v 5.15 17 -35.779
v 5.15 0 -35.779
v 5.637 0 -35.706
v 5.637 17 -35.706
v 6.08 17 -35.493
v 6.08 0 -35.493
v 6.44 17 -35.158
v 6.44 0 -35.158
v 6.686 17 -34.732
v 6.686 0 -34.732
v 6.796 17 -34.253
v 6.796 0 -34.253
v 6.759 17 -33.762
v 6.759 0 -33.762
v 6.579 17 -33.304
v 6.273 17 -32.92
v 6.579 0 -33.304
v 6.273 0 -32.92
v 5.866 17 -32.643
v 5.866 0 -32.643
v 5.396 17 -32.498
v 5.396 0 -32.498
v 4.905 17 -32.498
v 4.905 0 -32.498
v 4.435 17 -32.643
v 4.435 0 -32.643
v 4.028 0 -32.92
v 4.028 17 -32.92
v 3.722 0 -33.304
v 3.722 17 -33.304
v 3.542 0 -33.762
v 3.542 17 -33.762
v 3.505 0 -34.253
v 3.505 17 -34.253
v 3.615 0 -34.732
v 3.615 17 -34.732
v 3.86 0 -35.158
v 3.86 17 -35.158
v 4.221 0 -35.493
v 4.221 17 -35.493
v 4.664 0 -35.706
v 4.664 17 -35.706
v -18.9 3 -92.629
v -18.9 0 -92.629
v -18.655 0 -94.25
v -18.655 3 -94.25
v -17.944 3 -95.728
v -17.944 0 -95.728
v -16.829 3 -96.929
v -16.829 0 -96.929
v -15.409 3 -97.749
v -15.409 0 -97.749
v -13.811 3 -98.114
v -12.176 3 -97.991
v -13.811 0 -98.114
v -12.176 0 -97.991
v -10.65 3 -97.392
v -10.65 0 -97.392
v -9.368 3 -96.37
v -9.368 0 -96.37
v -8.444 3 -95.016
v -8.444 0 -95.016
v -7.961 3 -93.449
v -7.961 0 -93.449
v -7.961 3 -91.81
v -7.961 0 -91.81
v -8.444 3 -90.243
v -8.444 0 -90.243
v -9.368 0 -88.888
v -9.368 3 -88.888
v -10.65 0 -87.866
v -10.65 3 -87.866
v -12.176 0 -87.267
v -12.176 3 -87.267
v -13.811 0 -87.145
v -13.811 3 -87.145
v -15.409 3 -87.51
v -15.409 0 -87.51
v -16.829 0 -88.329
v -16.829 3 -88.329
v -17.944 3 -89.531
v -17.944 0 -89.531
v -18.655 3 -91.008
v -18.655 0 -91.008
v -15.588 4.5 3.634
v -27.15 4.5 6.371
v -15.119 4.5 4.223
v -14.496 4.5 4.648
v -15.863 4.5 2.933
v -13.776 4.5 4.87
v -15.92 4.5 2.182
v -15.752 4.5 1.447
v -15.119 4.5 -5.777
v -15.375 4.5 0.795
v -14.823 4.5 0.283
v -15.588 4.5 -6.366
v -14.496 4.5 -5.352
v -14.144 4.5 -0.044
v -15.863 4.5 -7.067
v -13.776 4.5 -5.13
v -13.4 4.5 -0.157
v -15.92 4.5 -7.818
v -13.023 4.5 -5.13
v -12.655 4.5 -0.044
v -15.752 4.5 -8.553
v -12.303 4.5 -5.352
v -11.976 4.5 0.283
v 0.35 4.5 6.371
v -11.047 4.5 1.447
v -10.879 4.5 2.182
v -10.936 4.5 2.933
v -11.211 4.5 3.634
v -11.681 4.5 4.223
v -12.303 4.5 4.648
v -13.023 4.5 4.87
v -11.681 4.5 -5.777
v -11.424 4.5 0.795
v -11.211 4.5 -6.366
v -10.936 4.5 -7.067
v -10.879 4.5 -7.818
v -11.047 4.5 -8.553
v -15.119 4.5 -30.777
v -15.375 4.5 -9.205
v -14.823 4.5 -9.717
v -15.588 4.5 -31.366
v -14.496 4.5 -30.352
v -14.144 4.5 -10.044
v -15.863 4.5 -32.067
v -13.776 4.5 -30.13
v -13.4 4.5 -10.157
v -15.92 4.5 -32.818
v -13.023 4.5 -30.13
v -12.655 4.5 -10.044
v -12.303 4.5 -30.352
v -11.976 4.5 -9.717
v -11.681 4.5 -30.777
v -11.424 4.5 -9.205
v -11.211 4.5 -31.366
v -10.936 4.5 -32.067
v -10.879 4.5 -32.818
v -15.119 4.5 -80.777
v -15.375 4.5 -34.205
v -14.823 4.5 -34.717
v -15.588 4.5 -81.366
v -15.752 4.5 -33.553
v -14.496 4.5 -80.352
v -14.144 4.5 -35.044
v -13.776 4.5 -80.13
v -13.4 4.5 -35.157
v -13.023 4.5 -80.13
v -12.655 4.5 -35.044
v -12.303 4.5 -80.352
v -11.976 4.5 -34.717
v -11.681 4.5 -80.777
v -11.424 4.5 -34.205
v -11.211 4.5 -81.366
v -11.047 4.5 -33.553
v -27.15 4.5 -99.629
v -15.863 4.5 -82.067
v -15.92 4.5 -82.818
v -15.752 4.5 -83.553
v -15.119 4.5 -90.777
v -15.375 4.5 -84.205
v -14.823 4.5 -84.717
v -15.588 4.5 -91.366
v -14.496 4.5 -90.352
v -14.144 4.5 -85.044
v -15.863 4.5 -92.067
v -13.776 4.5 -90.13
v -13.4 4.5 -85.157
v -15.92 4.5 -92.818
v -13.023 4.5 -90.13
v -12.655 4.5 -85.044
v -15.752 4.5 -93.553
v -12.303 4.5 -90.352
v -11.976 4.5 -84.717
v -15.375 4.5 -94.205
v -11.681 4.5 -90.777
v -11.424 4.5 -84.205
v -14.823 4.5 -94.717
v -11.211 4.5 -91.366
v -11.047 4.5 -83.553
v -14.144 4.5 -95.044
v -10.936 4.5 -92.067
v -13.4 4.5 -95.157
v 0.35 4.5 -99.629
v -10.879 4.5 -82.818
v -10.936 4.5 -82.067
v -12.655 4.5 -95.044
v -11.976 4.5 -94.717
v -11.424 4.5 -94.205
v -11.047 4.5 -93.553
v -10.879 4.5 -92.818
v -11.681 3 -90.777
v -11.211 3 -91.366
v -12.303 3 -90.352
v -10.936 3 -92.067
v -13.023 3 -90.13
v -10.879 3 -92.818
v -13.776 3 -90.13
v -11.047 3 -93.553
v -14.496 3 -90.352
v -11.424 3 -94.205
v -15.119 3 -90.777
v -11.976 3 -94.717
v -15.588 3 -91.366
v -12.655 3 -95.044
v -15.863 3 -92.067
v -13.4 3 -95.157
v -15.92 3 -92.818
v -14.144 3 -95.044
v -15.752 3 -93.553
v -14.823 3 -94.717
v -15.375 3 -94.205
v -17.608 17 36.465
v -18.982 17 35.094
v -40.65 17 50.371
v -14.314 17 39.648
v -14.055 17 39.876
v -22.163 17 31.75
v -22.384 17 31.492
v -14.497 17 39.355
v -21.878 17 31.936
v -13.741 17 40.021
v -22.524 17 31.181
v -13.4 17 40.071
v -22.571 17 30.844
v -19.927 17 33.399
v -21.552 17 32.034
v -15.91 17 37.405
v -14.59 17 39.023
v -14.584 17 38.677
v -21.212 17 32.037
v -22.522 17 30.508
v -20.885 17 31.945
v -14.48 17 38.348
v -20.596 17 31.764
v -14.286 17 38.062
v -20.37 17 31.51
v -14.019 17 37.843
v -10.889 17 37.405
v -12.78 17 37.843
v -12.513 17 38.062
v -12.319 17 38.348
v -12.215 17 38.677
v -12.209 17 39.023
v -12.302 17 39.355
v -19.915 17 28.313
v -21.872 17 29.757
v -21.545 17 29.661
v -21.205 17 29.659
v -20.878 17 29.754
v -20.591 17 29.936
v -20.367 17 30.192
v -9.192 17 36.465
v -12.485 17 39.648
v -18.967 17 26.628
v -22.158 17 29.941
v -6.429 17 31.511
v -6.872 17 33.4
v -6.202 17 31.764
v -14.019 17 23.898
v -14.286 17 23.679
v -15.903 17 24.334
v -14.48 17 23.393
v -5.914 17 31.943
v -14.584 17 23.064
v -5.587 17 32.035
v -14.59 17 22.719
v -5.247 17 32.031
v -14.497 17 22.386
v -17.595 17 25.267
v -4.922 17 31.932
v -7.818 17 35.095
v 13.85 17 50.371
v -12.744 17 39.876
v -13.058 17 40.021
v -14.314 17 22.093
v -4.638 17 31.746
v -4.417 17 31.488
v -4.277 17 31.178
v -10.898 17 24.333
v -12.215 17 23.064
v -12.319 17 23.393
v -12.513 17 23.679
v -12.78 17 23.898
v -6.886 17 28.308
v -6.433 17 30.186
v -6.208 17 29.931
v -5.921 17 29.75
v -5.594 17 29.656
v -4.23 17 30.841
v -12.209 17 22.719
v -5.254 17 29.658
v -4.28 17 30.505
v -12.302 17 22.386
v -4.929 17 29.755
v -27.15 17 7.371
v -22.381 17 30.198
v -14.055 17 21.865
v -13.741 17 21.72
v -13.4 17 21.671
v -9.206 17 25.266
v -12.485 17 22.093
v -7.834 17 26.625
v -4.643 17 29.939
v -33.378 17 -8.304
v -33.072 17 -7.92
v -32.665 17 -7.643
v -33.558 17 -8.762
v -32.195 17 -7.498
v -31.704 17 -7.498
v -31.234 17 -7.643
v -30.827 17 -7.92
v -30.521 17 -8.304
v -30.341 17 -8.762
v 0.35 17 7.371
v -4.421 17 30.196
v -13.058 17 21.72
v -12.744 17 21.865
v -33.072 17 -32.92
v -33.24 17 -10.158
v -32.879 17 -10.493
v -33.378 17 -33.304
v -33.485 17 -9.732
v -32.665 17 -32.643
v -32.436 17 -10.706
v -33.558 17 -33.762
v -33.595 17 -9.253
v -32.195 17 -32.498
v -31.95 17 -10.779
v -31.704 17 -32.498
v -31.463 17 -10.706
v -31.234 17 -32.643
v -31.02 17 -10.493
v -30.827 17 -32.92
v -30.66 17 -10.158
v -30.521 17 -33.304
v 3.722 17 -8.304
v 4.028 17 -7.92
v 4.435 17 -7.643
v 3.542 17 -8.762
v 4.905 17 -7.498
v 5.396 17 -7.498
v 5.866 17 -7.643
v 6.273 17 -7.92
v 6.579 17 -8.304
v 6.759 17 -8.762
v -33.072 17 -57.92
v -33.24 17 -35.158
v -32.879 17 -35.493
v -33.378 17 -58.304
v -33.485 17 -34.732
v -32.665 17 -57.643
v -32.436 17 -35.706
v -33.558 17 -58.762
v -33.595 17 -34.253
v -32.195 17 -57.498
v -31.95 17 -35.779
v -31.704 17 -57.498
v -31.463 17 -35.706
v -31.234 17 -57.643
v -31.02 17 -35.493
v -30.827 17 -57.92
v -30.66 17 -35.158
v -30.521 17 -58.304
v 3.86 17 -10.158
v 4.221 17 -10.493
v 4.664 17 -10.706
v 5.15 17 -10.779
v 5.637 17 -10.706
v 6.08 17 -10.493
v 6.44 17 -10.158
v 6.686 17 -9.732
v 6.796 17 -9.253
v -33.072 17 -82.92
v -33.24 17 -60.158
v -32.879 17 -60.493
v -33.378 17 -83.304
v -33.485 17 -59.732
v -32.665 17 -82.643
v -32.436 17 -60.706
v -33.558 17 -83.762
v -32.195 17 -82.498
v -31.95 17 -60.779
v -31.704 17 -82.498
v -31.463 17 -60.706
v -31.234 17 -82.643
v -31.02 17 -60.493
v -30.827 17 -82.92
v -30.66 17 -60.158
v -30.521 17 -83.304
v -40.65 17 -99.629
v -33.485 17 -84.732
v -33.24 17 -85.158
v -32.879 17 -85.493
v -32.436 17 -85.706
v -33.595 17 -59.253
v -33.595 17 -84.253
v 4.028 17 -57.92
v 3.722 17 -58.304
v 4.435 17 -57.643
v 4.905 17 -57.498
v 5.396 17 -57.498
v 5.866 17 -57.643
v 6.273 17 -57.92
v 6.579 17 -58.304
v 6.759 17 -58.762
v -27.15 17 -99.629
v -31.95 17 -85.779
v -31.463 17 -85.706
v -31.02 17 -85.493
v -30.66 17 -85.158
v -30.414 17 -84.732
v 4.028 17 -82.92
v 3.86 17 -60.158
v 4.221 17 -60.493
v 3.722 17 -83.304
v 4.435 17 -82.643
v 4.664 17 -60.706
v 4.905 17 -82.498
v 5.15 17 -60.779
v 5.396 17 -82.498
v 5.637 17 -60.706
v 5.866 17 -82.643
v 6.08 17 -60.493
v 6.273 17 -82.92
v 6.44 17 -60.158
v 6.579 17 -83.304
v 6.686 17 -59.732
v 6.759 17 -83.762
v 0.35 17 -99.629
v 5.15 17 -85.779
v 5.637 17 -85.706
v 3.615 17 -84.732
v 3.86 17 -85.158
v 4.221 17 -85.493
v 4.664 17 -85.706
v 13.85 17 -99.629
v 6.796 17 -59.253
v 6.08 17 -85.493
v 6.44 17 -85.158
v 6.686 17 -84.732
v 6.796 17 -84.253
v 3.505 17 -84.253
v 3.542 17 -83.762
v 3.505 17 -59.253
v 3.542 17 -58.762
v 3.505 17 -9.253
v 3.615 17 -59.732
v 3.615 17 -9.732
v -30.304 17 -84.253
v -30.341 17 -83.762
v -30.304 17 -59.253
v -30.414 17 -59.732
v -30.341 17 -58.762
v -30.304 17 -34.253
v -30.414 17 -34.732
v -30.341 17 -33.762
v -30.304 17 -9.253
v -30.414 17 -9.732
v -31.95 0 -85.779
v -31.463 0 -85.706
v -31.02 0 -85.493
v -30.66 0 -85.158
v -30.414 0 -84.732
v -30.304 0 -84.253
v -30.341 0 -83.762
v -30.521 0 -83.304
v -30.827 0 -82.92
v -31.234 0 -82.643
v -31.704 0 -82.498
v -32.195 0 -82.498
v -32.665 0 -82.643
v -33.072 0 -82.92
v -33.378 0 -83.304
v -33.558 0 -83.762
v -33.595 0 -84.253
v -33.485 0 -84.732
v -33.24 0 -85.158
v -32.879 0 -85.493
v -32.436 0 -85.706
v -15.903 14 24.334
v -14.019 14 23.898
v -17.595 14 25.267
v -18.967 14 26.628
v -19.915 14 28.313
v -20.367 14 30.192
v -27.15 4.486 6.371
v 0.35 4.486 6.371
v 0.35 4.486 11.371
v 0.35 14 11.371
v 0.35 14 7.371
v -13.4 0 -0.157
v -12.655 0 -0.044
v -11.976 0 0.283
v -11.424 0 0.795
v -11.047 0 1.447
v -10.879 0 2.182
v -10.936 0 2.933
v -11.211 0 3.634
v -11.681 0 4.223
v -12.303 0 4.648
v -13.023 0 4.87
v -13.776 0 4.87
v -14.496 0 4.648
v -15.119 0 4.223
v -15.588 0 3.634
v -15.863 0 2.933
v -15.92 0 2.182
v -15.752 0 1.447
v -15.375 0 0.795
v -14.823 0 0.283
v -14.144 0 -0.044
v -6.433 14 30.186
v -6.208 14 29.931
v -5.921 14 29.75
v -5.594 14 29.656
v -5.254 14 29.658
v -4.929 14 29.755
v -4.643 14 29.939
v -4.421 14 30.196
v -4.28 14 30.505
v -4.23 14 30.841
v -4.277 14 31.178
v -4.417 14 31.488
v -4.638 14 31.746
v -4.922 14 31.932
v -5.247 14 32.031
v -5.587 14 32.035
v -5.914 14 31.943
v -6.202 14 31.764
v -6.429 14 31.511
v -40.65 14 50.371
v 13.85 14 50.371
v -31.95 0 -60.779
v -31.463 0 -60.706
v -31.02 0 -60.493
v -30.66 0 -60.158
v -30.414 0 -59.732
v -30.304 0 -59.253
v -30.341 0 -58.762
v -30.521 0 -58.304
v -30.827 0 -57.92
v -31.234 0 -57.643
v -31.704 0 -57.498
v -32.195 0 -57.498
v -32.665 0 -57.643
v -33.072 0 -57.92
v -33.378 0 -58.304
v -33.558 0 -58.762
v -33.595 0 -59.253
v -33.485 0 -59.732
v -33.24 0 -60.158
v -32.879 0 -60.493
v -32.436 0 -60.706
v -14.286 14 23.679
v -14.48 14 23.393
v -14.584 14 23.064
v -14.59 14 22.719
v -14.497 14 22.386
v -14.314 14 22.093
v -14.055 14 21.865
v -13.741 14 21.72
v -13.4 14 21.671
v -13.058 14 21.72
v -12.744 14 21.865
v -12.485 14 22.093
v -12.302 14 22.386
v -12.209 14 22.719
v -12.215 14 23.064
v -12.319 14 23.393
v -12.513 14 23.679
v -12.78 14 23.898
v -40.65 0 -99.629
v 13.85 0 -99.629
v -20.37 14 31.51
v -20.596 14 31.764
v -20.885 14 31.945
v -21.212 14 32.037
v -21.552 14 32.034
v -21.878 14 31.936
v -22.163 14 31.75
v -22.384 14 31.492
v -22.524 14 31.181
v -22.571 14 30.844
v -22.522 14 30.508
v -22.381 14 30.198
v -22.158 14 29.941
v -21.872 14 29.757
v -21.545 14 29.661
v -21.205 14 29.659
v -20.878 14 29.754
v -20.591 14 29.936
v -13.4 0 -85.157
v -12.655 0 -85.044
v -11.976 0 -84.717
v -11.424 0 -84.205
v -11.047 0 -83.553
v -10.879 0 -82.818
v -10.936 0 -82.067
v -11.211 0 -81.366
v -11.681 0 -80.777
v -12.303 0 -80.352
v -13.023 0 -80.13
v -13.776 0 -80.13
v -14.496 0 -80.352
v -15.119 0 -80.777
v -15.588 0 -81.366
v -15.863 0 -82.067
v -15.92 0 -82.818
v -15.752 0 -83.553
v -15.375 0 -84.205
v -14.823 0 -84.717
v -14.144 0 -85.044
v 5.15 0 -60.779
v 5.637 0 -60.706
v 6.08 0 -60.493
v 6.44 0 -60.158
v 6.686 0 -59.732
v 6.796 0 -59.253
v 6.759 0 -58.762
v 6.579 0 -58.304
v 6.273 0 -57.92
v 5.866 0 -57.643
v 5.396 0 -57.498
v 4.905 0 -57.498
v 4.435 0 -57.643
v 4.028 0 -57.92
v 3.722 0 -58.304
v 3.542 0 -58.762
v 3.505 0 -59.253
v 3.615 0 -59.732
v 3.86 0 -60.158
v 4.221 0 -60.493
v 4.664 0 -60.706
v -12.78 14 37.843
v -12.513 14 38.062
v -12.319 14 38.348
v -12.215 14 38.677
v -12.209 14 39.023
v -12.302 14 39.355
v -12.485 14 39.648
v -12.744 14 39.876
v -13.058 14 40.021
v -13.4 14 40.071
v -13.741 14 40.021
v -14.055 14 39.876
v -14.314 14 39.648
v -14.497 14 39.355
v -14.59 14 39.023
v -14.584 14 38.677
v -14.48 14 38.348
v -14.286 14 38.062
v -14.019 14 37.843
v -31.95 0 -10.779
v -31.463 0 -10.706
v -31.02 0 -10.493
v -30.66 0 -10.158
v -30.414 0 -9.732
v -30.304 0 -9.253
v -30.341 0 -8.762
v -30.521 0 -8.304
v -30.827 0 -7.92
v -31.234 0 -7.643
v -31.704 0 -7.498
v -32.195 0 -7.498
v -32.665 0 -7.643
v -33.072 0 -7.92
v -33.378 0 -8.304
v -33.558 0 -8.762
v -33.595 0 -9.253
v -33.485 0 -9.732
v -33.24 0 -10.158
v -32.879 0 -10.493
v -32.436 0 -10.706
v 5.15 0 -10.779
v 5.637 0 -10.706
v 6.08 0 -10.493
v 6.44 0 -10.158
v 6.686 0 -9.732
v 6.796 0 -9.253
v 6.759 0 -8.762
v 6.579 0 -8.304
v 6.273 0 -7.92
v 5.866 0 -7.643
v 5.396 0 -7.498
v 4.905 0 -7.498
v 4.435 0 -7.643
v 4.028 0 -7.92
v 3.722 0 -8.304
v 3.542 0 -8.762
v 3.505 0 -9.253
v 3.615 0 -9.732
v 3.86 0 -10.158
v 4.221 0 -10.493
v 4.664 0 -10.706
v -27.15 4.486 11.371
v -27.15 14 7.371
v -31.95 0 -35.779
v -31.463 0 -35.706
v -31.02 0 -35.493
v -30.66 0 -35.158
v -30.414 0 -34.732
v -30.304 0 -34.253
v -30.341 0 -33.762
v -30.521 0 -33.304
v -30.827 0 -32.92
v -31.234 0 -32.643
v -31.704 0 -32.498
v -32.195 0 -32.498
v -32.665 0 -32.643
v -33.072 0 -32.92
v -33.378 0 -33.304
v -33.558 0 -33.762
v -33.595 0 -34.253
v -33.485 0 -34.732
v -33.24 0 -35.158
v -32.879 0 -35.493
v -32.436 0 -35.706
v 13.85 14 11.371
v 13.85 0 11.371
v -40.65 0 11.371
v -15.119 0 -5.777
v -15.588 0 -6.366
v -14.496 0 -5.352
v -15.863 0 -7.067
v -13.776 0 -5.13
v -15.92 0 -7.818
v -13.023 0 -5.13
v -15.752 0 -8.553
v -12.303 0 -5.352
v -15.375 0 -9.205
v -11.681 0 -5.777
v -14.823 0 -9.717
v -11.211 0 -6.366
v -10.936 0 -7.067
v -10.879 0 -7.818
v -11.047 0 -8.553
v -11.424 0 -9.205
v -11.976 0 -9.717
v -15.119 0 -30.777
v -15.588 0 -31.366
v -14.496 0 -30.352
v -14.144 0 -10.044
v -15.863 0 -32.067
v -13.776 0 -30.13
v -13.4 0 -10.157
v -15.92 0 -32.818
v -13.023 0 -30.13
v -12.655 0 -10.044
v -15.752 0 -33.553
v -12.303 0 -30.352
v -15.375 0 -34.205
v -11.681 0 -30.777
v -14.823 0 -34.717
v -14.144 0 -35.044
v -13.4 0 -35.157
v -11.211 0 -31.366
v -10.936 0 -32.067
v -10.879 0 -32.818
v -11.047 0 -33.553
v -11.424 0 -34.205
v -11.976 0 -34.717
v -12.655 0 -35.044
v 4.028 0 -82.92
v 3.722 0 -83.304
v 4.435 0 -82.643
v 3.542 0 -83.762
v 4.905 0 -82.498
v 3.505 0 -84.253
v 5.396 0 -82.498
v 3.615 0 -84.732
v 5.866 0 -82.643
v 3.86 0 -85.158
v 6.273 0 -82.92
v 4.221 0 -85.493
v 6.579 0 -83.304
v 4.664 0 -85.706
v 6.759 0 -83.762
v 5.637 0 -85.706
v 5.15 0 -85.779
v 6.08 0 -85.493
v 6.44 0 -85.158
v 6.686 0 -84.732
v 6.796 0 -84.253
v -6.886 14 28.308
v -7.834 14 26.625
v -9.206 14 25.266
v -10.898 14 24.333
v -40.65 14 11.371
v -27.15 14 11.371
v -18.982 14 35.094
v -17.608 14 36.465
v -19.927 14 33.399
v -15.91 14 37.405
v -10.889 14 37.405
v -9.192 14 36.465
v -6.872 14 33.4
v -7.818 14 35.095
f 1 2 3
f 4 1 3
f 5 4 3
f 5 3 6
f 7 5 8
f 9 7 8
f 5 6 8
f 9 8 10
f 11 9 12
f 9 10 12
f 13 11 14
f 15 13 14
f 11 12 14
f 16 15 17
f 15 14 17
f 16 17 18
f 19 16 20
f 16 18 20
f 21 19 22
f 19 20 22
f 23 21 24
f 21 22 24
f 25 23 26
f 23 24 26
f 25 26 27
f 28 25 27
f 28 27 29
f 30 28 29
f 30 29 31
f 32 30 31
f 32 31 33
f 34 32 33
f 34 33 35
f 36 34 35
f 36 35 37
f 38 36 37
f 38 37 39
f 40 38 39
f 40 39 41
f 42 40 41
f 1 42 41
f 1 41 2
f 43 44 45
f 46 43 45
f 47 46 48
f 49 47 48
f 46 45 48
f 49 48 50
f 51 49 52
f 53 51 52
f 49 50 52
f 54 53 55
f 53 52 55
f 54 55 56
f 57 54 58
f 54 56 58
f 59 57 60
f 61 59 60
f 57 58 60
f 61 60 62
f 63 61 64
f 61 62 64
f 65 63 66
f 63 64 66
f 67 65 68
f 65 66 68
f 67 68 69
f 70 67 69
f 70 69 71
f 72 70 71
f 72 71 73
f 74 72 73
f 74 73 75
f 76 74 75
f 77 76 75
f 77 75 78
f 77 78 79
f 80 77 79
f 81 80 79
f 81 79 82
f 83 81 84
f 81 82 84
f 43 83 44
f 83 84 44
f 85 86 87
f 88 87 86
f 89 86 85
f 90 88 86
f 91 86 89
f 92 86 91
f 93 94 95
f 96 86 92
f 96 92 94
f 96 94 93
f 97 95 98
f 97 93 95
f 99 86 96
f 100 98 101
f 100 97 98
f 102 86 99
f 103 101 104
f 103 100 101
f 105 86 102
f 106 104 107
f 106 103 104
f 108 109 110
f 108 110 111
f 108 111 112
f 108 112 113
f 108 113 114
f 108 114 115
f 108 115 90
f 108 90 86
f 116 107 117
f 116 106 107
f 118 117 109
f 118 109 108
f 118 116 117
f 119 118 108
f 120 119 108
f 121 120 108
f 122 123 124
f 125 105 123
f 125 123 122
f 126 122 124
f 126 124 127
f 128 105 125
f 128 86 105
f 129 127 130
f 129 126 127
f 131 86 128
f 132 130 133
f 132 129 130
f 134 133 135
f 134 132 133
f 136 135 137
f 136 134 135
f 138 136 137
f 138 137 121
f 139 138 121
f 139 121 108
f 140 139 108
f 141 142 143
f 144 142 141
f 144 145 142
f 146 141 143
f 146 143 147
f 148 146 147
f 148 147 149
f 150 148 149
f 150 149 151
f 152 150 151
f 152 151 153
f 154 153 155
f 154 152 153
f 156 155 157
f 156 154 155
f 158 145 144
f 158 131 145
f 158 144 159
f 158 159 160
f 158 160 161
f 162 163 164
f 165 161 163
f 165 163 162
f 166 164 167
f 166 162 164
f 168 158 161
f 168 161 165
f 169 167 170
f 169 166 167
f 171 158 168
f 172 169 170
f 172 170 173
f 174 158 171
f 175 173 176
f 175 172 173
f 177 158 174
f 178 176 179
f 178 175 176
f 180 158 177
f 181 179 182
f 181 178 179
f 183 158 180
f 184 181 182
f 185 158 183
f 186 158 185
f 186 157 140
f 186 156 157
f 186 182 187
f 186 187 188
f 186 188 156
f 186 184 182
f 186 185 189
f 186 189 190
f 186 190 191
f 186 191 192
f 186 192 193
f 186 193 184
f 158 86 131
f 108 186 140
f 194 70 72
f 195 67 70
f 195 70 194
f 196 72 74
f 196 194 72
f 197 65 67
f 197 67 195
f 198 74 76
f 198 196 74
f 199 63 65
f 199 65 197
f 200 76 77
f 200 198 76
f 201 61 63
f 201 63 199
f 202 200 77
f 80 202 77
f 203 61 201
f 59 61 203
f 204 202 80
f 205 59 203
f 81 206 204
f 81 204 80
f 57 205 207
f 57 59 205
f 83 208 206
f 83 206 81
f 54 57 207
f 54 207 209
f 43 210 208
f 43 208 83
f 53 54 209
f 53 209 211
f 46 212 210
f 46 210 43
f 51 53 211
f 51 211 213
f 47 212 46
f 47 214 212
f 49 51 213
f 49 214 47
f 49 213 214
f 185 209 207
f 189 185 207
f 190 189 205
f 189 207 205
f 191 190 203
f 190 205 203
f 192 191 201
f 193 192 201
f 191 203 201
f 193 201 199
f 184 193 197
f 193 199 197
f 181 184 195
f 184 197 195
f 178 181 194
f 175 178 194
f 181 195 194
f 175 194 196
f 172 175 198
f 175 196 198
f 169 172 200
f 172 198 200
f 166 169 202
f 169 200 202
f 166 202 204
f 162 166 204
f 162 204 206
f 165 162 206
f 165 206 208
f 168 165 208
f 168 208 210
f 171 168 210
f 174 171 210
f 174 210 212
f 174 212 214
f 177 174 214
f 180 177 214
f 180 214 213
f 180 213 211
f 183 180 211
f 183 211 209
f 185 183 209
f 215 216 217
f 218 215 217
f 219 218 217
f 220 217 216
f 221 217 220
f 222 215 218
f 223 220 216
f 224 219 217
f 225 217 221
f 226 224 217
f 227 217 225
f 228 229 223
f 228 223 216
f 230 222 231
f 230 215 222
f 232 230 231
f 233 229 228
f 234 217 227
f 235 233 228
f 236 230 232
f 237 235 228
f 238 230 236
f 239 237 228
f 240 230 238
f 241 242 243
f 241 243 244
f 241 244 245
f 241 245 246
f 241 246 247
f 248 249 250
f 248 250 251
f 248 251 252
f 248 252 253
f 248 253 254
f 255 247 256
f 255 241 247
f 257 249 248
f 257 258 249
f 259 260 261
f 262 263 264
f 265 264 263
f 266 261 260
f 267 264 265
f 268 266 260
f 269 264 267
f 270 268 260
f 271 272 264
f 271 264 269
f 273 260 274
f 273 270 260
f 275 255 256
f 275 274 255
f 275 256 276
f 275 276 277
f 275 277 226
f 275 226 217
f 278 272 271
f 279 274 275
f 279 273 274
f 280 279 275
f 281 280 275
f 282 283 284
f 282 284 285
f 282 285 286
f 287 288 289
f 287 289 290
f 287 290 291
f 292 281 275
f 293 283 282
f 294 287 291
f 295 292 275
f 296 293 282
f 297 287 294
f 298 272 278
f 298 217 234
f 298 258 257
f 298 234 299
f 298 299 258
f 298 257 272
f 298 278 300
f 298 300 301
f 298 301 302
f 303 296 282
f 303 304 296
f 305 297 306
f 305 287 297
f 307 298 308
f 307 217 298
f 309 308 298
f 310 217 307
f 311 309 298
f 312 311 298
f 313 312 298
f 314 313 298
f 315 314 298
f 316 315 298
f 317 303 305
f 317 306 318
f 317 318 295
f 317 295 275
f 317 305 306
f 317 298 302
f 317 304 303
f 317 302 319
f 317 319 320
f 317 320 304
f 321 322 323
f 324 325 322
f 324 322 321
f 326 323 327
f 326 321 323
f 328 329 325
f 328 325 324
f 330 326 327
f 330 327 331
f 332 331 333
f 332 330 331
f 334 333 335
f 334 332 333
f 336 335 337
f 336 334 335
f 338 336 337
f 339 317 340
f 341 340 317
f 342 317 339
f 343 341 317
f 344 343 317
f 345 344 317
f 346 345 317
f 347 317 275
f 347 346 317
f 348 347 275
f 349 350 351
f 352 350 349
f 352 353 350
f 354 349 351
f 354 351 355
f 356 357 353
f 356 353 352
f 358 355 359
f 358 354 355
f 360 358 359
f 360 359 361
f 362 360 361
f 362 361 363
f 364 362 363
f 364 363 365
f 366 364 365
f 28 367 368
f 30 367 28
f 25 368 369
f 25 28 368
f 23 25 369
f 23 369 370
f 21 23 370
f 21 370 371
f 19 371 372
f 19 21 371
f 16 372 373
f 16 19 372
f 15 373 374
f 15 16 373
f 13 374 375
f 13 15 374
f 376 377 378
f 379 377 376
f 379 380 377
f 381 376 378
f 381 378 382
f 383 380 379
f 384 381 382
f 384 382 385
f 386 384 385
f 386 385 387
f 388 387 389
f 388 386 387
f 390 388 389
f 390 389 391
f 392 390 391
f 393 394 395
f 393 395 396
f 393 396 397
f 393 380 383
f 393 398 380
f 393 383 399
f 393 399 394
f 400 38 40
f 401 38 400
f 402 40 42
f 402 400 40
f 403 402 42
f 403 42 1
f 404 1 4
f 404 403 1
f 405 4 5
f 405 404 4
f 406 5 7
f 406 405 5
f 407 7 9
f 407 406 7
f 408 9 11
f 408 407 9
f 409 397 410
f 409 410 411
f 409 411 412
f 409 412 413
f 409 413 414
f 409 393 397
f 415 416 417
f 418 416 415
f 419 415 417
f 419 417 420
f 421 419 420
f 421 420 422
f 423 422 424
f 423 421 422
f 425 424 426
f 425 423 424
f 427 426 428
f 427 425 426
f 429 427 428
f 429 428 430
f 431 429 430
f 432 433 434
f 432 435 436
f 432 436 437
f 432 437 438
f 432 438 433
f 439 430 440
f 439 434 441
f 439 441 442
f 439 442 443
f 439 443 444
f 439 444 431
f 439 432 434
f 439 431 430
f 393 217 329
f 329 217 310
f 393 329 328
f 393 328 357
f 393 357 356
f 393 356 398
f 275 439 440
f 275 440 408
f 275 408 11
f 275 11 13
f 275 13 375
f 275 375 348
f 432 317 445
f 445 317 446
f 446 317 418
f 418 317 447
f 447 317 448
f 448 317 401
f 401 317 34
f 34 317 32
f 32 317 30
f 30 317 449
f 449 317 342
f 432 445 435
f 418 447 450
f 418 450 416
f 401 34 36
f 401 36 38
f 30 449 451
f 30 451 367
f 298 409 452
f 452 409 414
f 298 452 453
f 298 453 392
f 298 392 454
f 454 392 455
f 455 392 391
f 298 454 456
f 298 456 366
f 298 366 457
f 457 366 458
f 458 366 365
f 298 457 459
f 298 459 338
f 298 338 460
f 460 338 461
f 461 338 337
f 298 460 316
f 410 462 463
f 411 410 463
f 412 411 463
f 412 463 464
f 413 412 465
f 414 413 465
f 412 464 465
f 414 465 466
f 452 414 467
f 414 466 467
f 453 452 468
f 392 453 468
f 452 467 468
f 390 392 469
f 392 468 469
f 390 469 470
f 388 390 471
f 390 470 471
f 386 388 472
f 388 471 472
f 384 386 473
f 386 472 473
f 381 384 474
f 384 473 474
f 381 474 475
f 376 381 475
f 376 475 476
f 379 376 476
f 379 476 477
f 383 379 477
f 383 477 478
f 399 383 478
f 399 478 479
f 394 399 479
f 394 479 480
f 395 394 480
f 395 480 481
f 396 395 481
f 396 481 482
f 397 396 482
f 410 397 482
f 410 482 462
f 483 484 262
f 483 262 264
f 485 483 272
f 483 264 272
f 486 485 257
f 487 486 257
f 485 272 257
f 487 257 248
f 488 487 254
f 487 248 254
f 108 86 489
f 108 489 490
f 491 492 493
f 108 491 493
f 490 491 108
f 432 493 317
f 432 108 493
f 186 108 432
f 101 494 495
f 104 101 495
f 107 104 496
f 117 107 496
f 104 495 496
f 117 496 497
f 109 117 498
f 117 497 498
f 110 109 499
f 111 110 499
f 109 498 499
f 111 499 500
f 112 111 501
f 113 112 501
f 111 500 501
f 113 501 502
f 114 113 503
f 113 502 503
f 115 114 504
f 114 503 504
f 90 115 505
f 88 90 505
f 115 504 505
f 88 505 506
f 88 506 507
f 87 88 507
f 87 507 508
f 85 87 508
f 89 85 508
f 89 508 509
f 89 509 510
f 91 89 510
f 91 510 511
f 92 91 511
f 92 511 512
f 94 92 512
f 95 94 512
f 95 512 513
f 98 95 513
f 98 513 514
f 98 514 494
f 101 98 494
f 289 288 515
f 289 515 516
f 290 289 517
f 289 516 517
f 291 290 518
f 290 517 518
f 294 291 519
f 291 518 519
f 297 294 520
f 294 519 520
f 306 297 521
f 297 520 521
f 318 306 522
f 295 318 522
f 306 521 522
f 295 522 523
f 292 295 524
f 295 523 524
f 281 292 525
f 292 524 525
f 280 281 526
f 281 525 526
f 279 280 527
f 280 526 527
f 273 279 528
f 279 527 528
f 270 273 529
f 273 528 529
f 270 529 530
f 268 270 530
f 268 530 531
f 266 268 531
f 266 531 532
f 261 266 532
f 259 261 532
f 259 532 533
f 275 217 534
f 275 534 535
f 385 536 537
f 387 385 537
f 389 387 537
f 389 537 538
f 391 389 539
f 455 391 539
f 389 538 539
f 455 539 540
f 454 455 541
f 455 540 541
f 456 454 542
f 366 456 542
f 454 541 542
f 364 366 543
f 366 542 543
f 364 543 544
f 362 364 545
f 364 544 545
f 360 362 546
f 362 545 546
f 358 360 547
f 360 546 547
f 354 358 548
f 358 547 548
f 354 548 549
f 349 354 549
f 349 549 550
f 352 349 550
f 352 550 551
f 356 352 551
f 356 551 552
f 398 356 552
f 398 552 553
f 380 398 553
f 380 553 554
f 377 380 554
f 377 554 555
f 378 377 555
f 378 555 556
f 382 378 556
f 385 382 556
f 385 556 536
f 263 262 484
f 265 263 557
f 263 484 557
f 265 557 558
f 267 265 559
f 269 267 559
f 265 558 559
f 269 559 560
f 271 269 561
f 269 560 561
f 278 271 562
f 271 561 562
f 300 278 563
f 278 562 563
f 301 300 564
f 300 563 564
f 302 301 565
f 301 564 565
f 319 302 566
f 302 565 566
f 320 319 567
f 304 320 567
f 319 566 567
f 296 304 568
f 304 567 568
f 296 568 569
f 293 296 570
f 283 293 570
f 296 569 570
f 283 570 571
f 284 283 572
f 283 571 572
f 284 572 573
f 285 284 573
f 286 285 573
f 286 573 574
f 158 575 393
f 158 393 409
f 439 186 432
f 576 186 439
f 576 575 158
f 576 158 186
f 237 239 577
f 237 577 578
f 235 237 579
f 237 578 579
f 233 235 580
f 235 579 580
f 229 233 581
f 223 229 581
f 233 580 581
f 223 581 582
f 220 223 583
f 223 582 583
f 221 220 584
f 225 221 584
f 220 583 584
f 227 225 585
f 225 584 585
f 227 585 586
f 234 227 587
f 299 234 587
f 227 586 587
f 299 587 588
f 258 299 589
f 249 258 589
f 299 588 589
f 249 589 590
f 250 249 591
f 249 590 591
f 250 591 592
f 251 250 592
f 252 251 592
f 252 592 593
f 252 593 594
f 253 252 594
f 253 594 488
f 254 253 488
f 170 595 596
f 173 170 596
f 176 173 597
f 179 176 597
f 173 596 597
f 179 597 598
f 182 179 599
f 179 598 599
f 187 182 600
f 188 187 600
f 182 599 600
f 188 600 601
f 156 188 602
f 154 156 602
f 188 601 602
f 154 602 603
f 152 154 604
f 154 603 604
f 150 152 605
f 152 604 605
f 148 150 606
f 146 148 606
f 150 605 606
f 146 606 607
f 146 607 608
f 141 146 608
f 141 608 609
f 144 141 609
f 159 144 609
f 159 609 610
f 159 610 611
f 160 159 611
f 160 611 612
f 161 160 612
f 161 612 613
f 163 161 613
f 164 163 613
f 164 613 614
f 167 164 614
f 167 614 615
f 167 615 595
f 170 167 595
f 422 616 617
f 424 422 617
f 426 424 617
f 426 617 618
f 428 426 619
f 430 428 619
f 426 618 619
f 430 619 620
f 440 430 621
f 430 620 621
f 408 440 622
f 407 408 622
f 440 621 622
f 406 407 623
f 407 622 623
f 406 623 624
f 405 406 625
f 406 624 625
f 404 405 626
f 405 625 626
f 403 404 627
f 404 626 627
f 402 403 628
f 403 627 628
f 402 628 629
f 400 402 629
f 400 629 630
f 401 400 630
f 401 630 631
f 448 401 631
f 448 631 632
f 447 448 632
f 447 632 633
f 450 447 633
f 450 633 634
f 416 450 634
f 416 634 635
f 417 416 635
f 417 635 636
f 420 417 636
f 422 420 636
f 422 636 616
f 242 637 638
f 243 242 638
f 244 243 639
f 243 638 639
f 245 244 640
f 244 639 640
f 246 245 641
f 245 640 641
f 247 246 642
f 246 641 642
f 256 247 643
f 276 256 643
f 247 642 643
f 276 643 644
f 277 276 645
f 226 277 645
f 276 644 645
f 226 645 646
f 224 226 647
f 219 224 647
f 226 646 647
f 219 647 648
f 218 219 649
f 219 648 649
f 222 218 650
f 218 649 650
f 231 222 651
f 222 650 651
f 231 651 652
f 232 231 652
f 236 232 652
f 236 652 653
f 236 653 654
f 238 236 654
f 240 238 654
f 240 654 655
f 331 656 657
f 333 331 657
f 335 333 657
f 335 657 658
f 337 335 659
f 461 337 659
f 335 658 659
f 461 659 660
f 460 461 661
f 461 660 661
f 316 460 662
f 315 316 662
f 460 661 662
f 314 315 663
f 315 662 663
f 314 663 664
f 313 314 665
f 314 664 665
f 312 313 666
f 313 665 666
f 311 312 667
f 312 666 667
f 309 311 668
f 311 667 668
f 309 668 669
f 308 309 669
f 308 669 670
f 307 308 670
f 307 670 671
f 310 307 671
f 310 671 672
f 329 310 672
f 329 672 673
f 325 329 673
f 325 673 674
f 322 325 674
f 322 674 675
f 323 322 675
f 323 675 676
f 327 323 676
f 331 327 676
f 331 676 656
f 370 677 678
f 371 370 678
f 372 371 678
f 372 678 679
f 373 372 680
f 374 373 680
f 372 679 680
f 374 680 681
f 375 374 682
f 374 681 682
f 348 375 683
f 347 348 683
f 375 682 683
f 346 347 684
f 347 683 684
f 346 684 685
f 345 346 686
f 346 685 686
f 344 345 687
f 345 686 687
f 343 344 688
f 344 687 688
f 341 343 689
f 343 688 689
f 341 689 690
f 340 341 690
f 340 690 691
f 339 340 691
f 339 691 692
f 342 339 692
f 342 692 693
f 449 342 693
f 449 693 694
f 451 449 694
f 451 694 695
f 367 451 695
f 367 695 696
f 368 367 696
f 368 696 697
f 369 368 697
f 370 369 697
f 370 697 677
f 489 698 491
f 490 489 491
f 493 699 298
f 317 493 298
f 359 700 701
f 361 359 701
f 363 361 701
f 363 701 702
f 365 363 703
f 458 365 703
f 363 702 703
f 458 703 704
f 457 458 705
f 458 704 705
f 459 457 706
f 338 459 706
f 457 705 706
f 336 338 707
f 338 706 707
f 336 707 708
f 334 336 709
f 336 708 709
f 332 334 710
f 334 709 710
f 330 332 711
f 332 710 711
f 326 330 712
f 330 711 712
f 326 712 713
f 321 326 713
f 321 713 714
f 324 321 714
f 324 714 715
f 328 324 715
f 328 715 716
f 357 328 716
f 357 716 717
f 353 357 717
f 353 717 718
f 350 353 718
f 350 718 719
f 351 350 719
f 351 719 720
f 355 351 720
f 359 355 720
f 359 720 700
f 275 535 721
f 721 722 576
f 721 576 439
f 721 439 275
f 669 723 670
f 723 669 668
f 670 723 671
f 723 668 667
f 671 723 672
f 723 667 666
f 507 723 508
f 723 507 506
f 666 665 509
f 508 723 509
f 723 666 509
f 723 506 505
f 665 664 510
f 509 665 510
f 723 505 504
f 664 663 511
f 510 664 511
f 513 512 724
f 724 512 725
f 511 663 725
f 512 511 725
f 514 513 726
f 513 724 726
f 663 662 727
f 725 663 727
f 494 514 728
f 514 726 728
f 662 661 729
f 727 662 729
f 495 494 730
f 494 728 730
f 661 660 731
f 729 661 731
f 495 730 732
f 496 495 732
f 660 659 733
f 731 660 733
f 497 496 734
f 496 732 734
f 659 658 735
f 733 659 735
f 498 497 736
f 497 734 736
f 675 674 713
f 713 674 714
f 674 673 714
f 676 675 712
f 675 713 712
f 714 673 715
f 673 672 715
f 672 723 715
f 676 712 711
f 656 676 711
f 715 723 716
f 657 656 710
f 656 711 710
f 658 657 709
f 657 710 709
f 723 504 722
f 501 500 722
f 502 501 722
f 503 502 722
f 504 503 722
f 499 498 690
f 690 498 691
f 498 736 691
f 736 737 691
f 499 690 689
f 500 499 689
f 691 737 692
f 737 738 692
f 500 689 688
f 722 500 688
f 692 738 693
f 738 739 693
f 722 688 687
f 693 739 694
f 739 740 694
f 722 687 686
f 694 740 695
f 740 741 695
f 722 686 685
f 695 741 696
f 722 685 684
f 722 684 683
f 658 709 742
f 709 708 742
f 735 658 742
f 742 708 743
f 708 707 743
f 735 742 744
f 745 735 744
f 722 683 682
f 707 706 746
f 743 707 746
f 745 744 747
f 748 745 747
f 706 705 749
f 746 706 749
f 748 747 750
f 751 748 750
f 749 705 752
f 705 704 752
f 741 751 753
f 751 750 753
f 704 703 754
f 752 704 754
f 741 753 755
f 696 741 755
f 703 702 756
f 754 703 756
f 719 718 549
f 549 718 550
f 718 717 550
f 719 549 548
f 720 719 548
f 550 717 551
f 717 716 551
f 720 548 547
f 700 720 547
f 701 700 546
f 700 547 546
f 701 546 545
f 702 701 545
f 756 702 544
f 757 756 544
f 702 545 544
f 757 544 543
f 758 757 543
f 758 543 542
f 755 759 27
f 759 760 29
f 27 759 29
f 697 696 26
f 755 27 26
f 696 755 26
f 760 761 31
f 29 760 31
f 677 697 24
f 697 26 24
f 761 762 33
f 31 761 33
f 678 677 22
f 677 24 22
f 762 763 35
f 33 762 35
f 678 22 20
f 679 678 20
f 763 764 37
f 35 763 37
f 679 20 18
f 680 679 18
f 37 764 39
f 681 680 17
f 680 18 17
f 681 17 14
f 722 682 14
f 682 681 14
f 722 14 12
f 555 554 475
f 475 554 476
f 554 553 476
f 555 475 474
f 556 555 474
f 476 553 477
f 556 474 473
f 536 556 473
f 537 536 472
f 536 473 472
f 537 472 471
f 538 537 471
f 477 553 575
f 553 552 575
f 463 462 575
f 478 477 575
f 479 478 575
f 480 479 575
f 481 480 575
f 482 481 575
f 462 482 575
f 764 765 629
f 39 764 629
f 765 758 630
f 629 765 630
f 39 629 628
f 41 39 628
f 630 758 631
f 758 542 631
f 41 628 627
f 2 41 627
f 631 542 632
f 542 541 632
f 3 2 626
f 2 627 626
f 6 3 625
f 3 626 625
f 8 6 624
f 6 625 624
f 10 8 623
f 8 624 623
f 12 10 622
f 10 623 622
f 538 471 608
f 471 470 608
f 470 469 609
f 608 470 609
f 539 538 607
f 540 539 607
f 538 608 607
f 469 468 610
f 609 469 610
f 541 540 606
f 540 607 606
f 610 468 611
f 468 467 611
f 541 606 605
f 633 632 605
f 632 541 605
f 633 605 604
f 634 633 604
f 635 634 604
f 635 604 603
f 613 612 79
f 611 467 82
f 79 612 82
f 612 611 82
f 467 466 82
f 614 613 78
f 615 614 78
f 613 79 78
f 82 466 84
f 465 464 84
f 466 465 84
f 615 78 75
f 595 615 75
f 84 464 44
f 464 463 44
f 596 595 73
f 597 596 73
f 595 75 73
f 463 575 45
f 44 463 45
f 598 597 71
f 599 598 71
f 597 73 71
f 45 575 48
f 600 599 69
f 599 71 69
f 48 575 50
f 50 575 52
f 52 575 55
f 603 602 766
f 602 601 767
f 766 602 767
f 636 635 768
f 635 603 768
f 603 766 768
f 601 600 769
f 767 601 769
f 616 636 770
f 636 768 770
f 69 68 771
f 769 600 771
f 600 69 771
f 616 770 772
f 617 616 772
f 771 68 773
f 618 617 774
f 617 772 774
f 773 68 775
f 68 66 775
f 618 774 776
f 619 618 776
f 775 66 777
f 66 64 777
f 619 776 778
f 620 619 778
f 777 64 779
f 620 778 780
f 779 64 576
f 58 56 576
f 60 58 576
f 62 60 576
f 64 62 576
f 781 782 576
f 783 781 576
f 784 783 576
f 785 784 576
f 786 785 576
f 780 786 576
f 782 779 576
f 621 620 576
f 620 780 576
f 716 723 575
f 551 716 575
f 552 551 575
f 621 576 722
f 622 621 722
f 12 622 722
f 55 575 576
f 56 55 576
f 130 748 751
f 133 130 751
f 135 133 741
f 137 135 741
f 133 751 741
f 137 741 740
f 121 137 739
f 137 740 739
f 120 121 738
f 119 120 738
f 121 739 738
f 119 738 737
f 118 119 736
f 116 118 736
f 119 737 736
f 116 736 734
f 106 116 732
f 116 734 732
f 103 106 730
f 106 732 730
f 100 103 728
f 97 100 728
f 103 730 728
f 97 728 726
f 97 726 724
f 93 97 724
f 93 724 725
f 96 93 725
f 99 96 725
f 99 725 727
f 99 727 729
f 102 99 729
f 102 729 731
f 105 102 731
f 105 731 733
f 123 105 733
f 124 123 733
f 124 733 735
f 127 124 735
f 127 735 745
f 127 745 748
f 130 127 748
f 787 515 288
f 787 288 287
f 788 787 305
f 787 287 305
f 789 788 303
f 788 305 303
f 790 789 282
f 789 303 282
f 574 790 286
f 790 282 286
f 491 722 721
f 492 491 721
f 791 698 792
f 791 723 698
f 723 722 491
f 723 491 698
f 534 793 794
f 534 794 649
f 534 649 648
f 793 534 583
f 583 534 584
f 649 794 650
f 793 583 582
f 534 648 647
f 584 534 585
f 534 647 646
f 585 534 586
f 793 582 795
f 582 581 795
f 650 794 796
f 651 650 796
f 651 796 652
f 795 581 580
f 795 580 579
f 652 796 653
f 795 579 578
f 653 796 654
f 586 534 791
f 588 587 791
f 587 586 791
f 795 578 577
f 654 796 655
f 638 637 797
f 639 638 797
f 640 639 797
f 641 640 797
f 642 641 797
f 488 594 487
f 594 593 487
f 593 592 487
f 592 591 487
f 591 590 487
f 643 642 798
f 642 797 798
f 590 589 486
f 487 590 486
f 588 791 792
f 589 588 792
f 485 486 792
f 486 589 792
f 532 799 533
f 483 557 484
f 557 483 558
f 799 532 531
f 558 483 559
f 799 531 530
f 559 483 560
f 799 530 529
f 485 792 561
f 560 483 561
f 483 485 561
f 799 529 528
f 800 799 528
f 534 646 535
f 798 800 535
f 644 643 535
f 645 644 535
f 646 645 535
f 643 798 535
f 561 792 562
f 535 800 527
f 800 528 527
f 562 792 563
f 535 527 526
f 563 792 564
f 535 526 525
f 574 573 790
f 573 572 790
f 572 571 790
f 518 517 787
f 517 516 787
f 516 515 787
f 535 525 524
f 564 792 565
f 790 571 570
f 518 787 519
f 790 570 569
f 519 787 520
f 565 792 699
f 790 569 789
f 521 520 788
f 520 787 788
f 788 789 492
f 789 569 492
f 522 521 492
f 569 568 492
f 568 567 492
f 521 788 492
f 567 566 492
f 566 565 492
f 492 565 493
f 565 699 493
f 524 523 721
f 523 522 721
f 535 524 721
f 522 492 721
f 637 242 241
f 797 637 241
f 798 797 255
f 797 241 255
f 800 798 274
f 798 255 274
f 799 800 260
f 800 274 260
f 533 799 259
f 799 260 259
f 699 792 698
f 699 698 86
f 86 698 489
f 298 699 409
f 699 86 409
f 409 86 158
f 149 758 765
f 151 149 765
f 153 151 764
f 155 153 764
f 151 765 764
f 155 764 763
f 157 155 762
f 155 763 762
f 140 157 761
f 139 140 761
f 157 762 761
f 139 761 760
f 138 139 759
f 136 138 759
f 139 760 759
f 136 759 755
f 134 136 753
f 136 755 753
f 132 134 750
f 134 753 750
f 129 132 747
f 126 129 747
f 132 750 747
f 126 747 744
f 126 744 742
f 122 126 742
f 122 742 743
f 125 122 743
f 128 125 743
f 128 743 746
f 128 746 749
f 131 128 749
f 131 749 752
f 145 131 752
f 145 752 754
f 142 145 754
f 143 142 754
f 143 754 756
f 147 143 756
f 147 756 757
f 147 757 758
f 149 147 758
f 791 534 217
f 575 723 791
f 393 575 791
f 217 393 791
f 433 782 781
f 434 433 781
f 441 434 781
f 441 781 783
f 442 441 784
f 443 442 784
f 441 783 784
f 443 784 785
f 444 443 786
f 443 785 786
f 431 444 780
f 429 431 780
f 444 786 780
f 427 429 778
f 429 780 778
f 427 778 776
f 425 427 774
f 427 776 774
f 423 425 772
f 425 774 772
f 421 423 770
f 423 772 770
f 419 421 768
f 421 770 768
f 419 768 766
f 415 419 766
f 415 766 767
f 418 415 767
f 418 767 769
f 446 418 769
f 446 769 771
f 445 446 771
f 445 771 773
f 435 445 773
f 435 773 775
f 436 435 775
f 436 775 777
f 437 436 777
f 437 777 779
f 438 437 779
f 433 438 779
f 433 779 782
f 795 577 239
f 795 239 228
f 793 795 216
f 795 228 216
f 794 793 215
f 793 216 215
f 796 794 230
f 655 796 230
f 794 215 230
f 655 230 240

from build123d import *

# Parameters (mm, degrees)
SKETCH1_W                  = 54.5
SKETCH1_H                  = 111
BOSS_EXTRUDE1_DEPTH        = 4.5
SKETCH2_W                  = 13.5
SKETCH2_H                  = 111
BOSS_EXTRUDE2_DEPTH        = 12.5
M4X0_7_TAPPED_HOLE1_D      = 3.3
SKETCH6_W                  = 4
SKETCH6_H                  = 12.5
BOSS_EXTRUDE3_DEPTH        = 37
SKETCH7_W                  = 54.5
SKETCH7_H                  = 3
BOSS_EXTRUDE5_DEPTH        = 39
SKETCH8_R                  = 7
CUT_EXTRUDE1_DEPTH         = 3
M2_CLEARANCE_HOLE1_D       = 2.4
F_8_0_199_DIAMETER_HOLE1_D = 5.0546
SKETCH12_R                 = 5.5
CUT_EXTRUDE3_DEPTH         = 3
SKETCH13_W                 = 27.5
SKETCH13_H                 = 9.513667368
CUT_EXTRUDE4_DEPTH         = 5


with BuildPart() as part:
    # Sketch1 → Boss-Extrude1 (new body)
    with BuildSketch(Plane(origin=(0, 0, 0), x_dir=(1, 0, 0), z_dir=(0, 1, 0))):
        with Locations((-13.399543841, 44.129312584)):
            Rectangle(SKETCH1_W, SKETCH1_H)
    extrude(amount=BOSS_EXTRUDE1_DEPTH)

    # Sketch2 → Boss-Extrude2 (add)
    with BuildSketch(Plane(origin=(0, 4.5, 0), x_dir=(1, 0, 0), z_dir=(0, 1, 0))):
        with Locations((7.100456159, 44.129312584)):
            Rectangle(SKETCH2_W, SKETCH2_H)
        with Locations((-33.899543841, 44.129312584)):
            Rectangle(SKETCH2_W, SKETCH2_H)
    extrude(amount=BOSS_EXTRUDE2_DEPTH)

    # M4x0.7 Tapped Hole1 (through all)
    with Locations(Plane(origin=(-31.949543841, 17, -9.129312584), x_dir=(0, 0, 1), z_dir=(0, 1, 0))):
        with Locations((0, 0), (-25, 0), (-50, 0), (-75, 0), (0, 37.1), (-25, 37.1), (-50, 37.1), (-75, 37.1)):
            Hole(M4X0_7_TAPPED_HOLE1_D / 2)

    # Sketch6 → Boss-Extrude3 (add)
    with BuildSketch(Plane(origin=(-27.149543841, 0, 0), x_dir=(0, 0, -1), z_dir=(1, 0, 0))):
        with Locations((-9.370687416, 10.75)):
            Rectangle(SKETCH6_W, SKETCH6_H)
    extrude(amount=BOSS_EXTRUDE3_DEPTH)

    # Sketch7 → Boss-Extrude5 (add)
    with BuildSketch(Plane.XY.offset(11.370687416)):
        with Locations((-13.399543841, 15.5)):
            Rectangle(SKETCH7_W, SKETCH7_H)
    extrude(amount=BOSS_EXTRUDE5_DEPTH)

    # Sketch8 → Cut-Extrude1 (cut)
    with BuildSketch(Plane(origin=(0, 17, 0), x_dir=(1, 0, 0), z_dir=(0, 1, 0))):
        with Locations((-13.399543841, -30.870687416)):
            Circle(SKETCH8_R)
    extrude(amount=-CUT_EXTRUDE1_DEPTH, mode=Mode.SUBTRACT)

    # M2 Clearance Hole1 (through all)
    with Locations(Plane(origin=(-21.371437118, 17, 30.847906254), x_dir=(0, 0, 1), z_dir=(0, 1, 0))):
        with Locations((0, 0), (-7.977218838, 7.971893277), (8.022781162, 7.971893277), (-0.002806072, 15.940961576)):
            Hole(M2_CLEARANCE_HOLE1_D / 2)

    # #8 (0.199) Diameter Hole1 (through all)
    with Locations(Plane(origin=(-13.399543841, 4.5, 2.370687416), x_dir=(0, 0, 1), z_dir=(0, 1, 0))):
        with Locations((0, 0), (-10, 0), (-35, 0), (-85, 0), (-95, 0)):
            Hole(F_8_0_199_DIAMETER_HOLE1_D / 2)

    # Sketch12 → Cut-Extrude3 (cut)
    with BuildSketch(Plane(origin=(0, 0, 0), x_dir=(-1, 0, 0), z_dir=(0, -1, 0))):
        with Locations((13.399543841, 92.629312584)):
            Circle(SKETCH12_R)
    extrude(amount=-CUT_EXTRUDE3_DEPTH, mode=Mode.SUBTRACT)

    # Sketch13 → Cut-Extrude4 (cut)
    with BuildSketch(Plane.XY.offset(11.370687416)):
        with Locations((-13.399543841, 9.243166316)):
            Rectangle(SKETCH13_W, SKETCH13_H)
    extrude(amount=-CUT_EXTRUDE4_DEPTH, mode=Mode.SUBTRACT)


solid = part.part
